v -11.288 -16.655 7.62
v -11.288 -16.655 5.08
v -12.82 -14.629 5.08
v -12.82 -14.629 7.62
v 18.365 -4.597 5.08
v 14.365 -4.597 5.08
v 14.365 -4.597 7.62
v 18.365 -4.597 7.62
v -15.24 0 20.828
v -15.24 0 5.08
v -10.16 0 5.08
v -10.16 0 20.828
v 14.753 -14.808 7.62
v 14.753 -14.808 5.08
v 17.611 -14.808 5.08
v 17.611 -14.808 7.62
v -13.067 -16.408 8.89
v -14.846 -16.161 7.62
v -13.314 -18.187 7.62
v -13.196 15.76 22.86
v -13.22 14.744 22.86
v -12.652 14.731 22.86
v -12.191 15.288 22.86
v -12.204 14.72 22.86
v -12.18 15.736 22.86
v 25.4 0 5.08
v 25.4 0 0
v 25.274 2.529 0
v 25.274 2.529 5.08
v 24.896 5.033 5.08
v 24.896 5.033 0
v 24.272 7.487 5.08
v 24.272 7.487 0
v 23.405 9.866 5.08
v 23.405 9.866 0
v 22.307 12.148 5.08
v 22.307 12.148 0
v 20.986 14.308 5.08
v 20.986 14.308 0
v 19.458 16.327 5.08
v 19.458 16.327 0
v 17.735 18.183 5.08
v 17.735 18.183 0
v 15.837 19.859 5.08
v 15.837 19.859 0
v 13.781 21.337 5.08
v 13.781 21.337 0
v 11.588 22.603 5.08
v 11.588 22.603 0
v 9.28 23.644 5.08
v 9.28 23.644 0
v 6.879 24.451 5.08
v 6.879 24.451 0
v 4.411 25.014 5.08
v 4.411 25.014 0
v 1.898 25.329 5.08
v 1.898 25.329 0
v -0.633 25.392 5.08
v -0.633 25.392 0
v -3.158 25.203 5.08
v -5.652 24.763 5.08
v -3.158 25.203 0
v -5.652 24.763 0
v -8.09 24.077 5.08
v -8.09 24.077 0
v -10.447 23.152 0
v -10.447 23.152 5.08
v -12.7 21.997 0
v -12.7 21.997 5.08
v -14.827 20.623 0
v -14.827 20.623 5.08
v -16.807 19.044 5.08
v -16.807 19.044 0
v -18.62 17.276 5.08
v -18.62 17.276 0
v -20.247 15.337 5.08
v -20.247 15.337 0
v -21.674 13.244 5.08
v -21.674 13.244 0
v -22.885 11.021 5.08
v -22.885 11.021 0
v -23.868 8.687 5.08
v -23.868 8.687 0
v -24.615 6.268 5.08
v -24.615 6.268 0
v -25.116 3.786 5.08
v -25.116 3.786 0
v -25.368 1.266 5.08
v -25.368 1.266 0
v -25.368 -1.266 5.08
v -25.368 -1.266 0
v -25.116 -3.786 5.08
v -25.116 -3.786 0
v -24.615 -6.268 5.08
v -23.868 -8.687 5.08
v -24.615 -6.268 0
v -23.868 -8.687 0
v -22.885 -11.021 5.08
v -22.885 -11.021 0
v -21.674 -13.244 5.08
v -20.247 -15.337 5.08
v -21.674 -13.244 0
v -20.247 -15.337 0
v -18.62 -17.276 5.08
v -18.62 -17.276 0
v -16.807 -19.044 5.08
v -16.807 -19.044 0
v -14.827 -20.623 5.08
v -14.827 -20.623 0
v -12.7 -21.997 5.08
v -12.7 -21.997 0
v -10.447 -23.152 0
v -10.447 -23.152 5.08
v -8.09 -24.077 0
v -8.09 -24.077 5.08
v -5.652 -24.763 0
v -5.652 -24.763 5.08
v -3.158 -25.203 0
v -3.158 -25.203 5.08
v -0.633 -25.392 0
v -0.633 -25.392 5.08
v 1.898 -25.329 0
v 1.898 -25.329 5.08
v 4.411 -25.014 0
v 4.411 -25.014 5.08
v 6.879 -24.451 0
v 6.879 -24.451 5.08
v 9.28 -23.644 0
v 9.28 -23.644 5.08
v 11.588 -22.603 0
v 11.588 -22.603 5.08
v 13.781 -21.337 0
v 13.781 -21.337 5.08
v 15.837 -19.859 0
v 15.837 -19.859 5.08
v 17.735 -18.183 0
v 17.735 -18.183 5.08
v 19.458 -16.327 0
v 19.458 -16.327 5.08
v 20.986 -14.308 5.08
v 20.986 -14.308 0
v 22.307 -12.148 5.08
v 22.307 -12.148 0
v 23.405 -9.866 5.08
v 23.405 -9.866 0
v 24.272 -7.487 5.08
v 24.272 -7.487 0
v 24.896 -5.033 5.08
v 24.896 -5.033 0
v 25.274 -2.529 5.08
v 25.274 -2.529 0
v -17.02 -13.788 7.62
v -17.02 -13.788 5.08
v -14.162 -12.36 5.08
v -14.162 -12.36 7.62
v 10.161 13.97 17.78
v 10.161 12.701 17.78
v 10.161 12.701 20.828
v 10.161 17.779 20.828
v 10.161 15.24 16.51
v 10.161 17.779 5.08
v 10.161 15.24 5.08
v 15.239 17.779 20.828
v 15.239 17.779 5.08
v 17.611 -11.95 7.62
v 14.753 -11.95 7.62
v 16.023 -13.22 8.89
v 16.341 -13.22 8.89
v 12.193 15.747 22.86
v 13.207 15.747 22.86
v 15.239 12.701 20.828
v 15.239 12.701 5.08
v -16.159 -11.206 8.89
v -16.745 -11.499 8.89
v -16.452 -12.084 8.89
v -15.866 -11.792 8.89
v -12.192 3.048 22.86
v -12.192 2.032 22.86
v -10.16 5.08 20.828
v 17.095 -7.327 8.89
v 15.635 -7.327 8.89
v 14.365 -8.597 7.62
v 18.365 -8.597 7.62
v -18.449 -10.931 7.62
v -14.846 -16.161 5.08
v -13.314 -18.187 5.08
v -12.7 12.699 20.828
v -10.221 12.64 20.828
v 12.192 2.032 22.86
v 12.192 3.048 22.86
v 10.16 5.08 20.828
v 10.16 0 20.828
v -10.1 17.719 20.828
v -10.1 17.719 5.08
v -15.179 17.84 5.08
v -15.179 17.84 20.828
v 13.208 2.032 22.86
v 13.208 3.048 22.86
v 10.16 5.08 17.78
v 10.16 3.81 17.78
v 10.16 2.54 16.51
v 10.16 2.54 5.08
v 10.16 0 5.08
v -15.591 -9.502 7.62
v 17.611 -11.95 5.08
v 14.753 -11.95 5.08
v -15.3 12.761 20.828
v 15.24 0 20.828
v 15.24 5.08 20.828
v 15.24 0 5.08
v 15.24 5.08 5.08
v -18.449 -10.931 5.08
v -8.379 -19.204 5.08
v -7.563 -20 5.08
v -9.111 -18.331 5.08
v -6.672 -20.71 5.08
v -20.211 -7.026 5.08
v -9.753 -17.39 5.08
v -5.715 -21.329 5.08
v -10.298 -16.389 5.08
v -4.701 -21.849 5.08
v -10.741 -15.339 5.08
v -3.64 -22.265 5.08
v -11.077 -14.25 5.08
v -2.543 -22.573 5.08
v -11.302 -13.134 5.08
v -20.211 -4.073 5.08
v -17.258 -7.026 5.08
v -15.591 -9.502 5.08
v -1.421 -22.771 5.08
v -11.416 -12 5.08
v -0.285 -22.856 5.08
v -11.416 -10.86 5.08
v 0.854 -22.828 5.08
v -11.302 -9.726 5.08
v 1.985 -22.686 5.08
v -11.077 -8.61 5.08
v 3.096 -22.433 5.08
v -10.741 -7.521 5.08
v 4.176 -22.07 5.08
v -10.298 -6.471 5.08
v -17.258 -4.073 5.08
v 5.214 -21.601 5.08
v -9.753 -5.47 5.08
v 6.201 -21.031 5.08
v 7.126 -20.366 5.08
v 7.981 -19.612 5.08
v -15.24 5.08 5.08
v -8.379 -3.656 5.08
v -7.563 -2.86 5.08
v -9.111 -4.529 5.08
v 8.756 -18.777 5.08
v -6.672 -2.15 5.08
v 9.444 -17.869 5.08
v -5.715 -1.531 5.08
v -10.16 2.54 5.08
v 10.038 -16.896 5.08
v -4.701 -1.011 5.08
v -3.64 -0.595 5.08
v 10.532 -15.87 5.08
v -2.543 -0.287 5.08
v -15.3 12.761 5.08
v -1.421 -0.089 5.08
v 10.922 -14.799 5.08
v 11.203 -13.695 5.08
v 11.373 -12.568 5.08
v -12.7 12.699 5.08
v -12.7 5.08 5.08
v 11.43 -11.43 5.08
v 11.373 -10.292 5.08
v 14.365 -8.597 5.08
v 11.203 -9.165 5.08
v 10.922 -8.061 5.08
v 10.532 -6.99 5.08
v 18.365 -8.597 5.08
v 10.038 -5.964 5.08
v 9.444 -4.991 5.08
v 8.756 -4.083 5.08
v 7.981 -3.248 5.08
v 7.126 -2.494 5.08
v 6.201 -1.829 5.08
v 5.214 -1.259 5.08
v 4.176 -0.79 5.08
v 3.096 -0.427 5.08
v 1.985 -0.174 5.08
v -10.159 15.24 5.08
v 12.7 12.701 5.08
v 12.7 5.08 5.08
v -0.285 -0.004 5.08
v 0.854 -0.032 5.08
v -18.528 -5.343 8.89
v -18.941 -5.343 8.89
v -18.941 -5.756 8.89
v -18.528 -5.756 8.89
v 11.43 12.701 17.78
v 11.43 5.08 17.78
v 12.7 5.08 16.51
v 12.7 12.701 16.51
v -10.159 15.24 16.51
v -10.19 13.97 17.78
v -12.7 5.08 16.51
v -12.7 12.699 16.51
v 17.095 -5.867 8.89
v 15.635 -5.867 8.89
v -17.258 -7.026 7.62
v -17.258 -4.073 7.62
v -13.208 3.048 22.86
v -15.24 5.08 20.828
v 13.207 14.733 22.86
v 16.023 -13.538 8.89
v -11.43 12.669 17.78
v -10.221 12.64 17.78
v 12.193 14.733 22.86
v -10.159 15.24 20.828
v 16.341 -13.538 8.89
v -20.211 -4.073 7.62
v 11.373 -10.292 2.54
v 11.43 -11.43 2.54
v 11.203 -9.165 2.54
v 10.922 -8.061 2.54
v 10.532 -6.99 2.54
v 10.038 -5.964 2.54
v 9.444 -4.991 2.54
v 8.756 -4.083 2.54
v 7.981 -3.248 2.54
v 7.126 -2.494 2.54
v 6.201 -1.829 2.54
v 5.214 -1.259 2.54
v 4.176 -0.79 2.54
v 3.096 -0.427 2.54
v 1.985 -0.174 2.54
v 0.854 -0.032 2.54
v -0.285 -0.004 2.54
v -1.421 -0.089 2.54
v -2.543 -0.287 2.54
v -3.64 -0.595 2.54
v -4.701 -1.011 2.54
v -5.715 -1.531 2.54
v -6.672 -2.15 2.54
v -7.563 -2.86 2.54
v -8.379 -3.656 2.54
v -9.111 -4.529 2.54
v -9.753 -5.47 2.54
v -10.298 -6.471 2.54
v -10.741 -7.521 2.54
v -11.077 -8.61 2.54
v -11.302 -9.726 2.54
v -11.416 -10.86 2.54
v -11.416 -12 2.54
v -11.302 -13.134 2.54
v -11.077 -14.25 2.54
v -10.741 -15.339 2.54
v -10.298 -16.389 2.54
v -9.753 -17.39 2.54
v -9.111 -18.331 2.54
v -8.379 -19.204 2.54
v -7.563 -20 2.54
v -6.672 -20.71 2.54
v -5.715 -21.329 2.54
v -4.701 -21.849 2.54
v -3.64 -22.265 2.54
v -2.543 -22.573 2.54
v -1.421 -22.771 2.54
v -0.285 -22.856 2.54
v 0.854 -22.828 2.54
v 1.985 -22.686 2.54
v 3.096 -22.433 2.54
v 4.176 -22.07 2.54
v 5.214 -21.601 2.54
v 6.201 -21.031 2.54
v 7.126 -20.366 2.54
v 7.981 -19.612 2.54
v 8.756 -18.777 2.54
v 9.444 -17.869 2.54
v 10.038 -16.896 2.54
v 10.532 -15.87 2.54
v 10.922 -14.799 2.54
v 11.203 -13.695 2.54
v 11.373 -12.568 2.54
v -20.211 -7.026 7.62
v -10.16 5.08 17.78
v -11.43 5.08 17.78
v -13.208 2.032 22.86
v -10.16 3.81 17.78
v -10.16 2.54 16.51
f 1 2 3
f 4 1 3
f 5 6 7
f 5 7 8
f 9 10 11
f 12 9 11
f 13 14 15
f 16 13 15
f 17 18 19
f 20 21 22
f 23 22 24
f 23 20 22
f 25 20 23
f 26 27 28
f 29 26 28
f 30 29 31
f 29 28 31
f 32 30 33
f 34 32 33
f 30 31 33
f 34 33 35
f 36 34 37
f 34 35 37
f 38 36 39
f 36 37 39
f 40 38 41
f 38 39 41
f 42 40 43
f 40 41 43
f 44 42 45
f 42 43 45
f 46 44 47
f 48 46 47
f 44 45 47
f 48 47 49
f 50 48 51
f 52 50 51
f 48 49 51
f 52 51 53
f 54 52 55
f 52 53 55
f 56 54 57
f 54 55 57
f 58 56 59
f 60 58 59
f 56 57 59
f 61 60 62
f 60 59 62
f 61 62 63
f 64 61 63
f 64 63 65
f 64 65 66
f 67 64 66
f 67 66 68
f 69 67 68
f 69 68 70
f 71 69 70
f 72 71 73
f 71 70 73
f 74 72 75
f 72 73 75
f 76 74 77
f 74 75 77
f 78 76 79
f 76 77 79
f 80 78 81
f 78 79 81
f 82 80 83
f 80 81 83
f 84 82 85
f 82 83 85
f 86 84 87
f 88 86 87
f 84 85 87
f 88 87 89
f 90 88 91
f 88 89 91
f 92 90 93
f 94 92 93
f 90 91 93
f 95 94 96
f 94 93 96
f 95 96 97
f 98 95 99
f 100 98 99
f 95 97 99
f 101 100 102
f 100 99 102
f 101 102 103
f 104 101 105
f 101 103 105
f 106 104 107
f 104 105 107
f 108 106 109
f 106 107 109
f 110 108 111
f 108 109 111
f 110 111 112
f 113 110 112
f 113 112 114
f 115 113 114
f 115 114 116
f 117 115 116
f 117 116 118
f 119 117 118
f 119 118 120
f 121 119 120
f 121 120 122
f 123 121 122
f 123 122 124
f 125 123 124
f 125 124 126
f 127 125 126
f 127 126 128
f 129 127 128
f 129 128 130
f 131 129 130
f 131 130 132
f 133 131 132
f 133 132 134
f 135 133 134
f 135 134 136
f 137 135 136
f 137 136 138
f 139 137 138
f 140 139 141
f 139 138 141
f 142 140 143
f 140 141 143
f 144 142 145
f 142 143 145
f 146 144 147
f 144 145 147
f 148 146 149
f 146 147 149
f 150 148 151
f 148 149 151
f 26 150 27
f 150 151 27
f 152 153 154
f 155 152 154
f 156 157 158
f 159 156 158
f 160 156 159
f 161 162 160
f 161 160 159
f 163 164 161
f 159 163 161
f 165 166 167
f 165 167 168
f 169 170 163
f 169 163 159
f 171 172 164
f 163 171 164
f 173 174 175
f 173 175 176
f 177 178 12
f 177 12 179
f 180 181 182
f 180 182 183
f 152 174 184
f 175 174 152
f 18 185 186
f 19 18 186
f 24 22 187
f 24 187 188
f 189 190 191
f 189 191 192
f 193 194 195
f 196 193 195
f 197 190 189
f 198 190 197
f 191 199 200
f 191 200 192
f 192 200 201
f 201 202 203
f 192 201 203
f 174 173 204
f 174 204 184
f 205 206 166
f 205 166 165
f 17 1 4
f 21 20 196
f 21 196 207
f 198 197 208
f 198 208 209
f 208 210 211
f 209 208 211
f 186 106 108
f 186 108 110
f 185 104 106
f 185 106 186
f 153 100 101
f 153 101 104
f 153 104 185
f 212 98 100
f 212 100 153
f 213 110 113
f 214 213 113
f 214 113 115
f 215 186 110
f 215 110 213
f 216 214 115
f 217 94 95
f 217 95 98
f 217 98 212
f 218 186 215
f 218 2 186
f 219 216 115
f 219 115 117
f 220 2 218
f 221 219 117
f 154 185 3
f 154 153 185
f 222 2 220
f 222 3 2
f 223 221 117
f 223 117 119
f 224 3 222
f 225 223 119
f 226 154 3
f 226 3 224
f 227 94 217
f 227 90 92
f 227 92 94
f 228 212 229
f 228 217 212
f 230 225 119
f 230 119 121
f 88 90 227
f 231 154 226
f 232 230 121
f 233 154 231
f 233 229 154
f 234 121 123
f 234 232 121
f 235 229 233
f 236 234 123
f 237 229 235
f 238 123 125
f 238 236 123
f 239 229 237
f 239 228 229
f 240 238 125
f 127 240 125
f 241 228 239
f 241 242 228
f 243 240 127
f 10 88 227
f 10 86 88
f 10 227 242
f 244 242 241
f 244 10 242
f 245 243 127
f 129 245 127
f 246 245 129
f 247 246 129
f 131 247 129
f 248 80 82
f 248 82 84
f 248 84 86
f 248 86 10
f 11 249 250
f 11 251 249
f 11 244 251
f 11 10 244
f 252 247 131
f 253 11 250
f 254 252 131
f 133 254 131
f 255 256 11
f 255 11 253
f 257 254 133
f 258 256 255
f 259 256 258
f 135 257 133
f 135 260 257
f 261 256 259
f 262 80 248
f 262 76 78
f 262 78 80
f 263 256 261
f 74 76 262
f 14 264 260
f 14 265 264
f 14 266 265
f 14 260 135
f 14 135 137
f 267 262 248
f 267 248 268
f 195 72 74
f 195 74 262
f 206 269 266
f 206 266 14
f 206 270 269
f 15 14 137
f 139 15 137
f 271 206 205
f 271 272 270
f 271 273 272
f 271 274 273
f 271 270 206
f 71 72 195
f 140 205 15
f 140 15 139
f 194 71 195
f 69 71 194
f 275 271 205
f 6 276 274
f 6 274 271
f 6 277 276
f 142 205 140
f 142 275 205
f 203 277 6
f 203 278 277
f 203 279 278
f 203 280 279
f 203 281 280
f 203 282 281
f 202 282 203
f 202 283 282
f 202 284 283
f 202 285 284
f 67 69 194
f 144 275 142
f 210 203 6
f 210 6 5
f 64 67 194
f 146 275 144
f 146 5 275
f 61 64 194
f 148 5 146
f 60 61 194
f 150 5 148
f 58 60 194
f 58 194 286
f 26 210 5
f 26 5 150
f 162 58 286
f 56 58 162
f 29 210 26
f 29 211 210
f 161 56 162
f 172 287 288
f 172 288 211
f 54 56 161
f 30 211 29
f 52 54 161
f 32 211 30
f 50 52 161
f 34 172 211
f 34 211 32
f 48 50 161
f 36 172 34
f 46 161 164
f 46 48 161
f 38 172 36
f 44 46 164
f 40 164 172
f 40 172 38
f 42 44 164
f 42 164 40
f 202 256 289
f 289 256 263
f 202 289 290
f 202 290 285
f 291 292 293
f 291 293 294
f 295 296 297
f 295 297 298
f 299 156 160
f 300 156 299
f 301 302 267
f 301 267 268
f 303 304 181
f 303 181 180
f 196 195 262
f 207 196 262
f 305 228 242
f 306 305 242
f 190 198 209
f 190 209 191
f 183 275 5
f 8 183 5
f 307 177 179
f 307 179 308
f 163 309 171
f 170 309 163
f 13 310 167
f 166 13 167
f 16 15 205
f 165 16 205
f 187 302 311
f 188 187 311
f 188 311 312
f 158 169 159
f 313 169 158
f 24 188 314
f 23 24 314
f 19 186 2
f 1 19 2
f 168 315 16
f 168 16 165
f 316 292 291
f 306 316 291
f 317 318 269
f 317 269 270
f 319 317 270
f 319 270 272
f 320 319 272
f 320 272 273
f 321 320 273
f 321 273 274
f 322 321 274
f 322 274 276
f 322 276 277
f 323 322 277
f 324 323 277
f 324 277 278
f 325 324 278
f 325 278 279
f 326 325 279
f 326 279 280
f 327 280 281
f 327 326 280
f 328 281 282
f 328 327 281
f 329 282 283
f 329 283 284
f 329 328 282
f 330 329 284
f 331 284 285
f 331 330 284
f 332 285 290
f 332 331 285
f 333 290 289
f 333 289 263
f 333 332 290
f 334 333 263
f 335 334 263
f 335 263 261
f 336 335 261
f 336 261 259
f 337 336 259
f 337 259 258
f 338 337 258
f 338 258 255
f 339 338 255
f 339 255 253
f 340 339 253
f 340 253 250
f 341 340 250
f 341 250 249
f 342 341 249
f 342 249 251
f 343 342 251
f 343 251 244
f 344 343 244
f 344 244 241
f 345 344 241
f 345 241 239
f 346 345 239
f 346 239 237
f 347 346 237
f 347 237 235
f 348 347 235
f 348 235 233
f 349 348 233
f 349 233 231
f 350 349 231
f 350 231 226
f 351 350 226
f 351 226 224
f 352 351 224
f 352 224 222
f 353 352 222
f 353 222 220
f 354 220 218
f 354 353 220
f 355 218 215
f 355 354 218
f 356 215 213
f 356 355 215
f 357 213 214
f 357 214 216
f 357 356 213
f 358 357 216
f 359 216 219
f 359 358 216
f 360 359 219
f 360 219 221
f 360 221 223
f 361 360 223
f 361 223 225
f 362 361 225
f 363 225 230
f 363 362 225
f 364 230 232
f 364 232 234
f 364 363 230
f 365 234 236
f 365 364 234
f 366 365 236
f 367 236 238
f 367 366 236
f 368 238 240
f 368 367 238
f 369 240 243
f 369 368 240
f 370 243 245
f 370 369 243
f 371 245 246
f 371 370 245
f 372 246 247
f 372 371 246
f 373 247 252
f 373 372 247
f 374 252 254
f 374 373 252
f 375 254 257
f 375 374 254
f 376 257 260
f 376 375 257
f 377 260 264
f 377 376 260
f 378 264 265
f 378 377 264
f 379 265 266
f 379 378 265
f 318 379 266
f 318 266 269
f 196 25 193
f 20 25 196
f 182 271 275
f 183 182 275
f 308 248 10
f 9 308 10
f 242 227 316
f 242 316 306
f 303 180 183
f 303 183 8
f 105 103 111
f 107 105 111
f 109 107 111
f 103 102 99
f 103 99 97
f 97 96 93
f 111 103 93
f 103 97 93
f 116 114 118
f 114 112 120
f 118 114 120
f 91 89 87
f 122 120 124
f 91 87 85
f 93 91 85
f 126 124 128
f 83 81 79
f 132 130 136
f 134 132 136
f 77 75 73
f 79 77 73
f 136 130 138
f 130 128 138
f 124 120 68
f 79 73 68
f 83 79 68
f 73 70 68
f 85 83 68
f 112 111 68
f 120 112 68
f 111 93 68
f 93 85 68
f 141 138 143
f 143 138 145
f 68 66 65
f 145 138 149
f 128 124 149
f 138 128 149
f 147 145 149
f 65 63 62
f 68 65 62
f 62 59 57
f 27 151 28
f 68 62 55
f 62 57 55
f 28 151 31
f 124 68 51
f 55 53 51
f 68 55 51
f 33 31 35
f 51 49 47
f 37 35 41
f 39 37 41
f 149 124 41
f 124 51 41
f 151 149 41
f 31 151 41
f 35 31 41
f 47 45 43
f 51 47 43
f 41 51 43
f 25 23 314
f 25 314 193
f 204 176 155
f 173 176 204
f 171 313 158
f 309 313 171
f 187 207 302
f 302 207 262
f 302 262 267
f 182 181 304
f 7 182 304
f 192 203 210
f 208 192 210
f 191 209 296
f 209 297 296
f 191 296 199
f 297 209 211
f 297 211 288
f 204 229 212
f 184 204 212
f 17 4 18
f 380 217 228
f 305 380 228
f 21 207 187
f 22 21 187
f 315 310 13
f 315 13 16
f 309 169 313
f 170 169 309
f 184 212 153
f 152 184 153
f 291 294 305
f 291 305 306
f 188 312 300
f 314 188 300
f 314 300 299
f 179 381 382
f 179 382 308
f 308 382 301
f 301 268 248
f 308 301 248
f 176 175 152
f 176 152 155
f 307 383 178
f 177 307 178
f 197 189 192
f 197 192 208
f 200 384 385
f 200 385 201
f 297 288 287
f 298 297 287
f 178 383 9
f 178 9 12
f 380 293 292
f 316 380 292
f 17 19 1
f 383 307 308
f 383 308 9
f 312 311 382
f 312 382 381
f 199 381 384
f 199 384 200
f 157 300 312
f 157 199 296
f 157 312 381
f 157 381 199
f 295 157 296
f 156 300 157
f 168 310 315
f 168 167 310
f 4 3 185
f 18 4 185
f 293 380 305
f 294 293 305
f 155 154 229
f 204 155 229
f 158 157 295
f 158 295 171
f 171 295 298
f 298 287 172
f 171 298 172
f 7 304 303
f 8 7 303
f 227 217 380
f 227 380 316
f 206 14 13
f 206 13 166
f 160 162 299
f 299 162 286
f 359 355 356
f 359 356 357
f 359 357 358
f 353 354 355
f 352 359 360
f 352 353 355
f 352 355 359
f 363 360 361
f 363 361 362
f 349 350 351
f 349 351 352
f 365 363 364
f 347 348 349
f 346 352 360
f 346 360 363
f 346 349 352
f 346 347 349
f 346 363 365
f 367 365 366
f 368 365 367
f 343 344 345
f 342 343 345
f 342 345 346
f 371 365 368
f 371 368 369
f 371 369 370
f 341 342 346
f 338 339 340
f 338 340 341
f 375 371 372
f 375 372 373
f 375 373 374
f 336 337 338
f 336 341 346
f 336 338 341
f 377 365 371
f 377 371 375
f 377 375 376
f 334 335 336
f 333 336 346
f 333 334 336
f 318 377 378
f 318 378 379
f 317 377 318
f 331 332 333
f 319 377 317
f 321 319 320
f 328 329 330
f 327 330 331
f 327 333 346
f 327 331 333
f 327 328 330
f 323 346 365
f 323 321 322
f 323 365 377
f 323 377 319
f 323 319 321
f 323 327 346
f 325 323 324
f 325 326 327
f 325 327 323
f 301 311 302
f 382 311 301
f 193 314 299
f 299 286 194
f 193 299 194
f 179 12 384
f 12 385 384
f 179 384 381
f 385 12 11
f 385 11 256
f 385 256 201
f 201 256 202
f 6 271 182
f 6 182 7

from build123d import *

# Parameters (mm, degrees)
F0_R     = 25.4
F0_W     = 2.9527507722
F0_H     = 2.9527507722
F0_R_2   = 11.43
F0_W_2   = 2.8575006872
F0_H_2   = 2.8575006872
F0_W_3   = 4.0005007759
F0_H_3   = 4.0005007759
F1_DEPTH = 5.08
F2_DEPTH = 2.54
F3_DEPTH = 17.78
F0_W_4   = 2.54
F0_H_4   = 2.54
F0_W_5   = 2.5392780889
F0_H_5   = 2.5392780889
F4_DEPTH = 22.86
F5_DEPTH = 8.89
F6_SIZE  = 1.26999
F7_SIZE  = 2.032
F8_SIZE  = 1.27


# Not quite as in the source:
# - a fillet or chamfer is up to 0.001 mm smaller than in the source, because OpenCascade refuses the exact size


with BuildPart() as f1:
    # F0 (on Top) → F1 (new body)
    with BuildSketch(Plane.XY):
        Circle(F0_R)
        Polygon((-14.8460203377, -16.160586299), (-12.8199555069, -14.6287046778), (-11.2880738857, -16.6547695086), (-13.3141387165, -18.1866511298), align=None, mode=Mode.SUBTRACT)
        Polygon((-17.0199228451, -13.7883033603), (-18.4486722574, -10.9308026731), (-15.5911715701, -9.5020532608), (-14.1624221578, -12.359553948), align=None, mode=Mode.SUBTRACT)
        with Locations((-18.734421581, -5.5491779931)):
            Rectangle(F0_W, F0_H, mode=Mode.SUBTRACT)
        with Locations((0, -11.43)):
            Circle(F0_R_2, mode=Mode.SUBTRACT)
        with Locations((16.1819914356, -13.3789330721)):
            Rectangle(F0_W_2, F0_H_2, mode=Mode.SUBTRACT)
        with Locations((16.3652040064, -6.5969279967)):
            Rectangle(F0_W_3, F0_H_3, mode=Mode.SUBTRACT)
        Polygon((-10.1001541496, 17.7187103274), (-10.1592772274, 15.24), (10.1607219111, 15.24), (10.1607219111, 17.7792780889), (15.2392780889, 17.7792780889), (15.2392780889, 12.7007219111), (12.7, 12.7007219111), (12.7, 5.08), (15.24, 5.08), (15.24, 0), (10.16, 0), (10.16, 2.54), (-10.16, 2.54), (-10.16, 0), (-15.24, 0), (-15.24, 5.08), (-12.7, 5.08), (-12.7, 12.6992772274), (-15.2998458504, 12.7612896726), (-15.1787103274, 17.8398458504), align=None, mode=Mode.SUBTRACT)
    extrude(amount=F1_DEPTH)

    # F0 (on Top) → F2 (join)
    with BuildSketch(Plane.XY):
        with Locations((0, -11.43)):
            Circle(F0_R_2)
    extrude(amount=F2_DEPTH)

    # F0 (on Top) → F3 (join)
    with BuildSketch(Plane.XY):
        Polygon((10.1607219111, 15.24), (-10.1592772274, 15.24), (-10.2212896726, 12.6401541496), (-12.7, 12.6992772274), (-12.7, 5.08), (-10.16, 5.08), (-10.16, 2.54), (10.16, 2.54), (10.16, 5.08), (12.7, 5.08), (12.7, 12.7007219111), (10.1607219111, 12.7007219111), align=None)
    extrude(amount=F3_DEPTH)

    # F0 (on Top) → F4 (join)
    with BuildSketch(Plane.XY):
        Polygon((-10.1592772274, 15.24), (-12.7, 15.24), (-12.7, 12.6992772274), (-10.2212896726, 12.6401541496), align=None)
        Polygon((-12.7, 12.6992772274), (-12.7, 15.24), (-10.1592772274, 15.24), (-10.1001541496, 17.7187103274), (-15.1787103274, 17.8398458504), (-15.2998458504, 12.7612896726), align=None)
        with Locations((-11.43, 3.81)):
            Rectangle(F0_W_4, F0_H_4)
        Polygon((-12.7, 2.54), (-12.7, 5.08), (-15.24, 5.08), (-15.24, 0), (-10.16, 0), (-10.16, 2.54), align=None)
        with Locations((11.4303609556, 13.9703609556)):
            Rectangle(F0_W_5, F0_H_5)
        Polygon((10.1607219111, 17.7792780889), (10.1607219111, 15.24), (12.7, 15.24), (12.7, 12.7007219111), (15.2392780889, 12.7007219111), (15.2392780889, 17.7792780889), align=None)
        with Locations((11.43, 3.81)):
            Rectangle(F0_W_4, F0_H_4)
        Polygon((15.24, 5.08), (12.7, 5.08), (12.7, 2.54), (10.16, 2.54), (10.16, 0), (15.24, 0), align=None)
    extrude(amount=F4_DEPTH)

    # F0 (on Top) → F5 (join)
    with BuildSketch(Plane.XY):
        with Locations((-18.734421581, -5.5491779931)):
            Rectangle(F0_W, F0_H)
        Polygon((-15.5911715701, -9.5020532608), (-18.4486722574, -10.9308026731), (-17.0199228451, -13.7883033603), (-14.1624221578, -12.359553948), align=None)
        Polygon((-11.2880738857, -16.6547695086), (-12.8199555069, -14.6287046778), (-14.8460203377, -16.160586299), (-13.3141387165, -18.1866511298), align=None)
        with Locations((16.3652040064, -6.5969279967)):
            Rectangle(F0_W_3, F0_H_3)
        with Locations((16.1819914356, -13.3789330721)):
            Rectangle(F0_W_2, F0_H_2)
    extrude(amount=F5_DEPTH)

    # F6 (size 1.27 in the source; OpenCascade refuses exactly that, so slightly less here)
    f6_edges = [f1.edges().sort_by_distance(p)[0] for p in [
        (-18.734422, -4.072803, 8.89),
        (-20.210797, -5.549178, 8.89),
        (-18.734422, -7.025553, 8.89),
        (-17.258046, -5.549178, 8.89),
        (-17.019922, -10.216428, 8.89),
        (-17.734298, -12.359553, 8.89),
        (-15.591173, -13.073929, 8.89),
        (-14.876797, -10.930804, 8.89),
        (-12.301106, -17.42071, 8.89),
        (-12.054015, -15.641737, 8.89),
        (-13.832988, -15.394645, 8.89),
        (-14.08008, -17.173619, 8.89),
        (16.365204, -4.596678, 8.89),
        (14.364954, -6.596928, 8.89),
        (16.365204, -8.597178, 8.89),
        (18.365454, -6.596928, 8.89),
        (16.181991, -14.807683, 8.89),
        (17.610742, -13.378933, 8.89),
        (16.181991, -11.950183, 8.89),
        (14.753241, -13.378933, 8.89),
    ]]
    chamfer(f6_edges, length=F6_SIZE)

    # F7
    f7_edges = [f1.edges().sort_by_distance(p)[0] for p in [
        (-10.160722, 15.179432, 22.86),
        (-12.639432, 17.779278, 22.86),
        (-15.239278, 15.300568, 22.86),
        (-12.760568, 12.700722, 22.86),
        (-12.7, 5.08, 22.86),
        (-15.24, 2.54, 22.86),
        (-12.7, 0, 22.86),
        (-10.16, 2.54, 22.86),
        (12.7, 12.700722, 22.86),
        (15.239278, 15.24, 22.86),
        (12.7, 17.779278, 22.86),
        (10.160722, 15.24, 22.86),
        (10.16, 2.54, 22.86),
        (12.7, 0, 22.86),
        (15.24, 2.54, 22.86),
        (12.7, 5.08, 22.86),
    ]]
    chamfer(f7_edges, length=F7_SIZE)

    # F8
    f8_edges = [f1.edges().sort_by_distance(p)[0] for p in [
        (0, 2.54, 17.78),
        (0.000722, 15.24, 17.78),
        (-12.7, 8.889639, 17.78),
        (12.7, 8.890361, 17.78),
    ]]
    chamfer(f8_edges, length=F8_SIZE)


solid = f1.part
